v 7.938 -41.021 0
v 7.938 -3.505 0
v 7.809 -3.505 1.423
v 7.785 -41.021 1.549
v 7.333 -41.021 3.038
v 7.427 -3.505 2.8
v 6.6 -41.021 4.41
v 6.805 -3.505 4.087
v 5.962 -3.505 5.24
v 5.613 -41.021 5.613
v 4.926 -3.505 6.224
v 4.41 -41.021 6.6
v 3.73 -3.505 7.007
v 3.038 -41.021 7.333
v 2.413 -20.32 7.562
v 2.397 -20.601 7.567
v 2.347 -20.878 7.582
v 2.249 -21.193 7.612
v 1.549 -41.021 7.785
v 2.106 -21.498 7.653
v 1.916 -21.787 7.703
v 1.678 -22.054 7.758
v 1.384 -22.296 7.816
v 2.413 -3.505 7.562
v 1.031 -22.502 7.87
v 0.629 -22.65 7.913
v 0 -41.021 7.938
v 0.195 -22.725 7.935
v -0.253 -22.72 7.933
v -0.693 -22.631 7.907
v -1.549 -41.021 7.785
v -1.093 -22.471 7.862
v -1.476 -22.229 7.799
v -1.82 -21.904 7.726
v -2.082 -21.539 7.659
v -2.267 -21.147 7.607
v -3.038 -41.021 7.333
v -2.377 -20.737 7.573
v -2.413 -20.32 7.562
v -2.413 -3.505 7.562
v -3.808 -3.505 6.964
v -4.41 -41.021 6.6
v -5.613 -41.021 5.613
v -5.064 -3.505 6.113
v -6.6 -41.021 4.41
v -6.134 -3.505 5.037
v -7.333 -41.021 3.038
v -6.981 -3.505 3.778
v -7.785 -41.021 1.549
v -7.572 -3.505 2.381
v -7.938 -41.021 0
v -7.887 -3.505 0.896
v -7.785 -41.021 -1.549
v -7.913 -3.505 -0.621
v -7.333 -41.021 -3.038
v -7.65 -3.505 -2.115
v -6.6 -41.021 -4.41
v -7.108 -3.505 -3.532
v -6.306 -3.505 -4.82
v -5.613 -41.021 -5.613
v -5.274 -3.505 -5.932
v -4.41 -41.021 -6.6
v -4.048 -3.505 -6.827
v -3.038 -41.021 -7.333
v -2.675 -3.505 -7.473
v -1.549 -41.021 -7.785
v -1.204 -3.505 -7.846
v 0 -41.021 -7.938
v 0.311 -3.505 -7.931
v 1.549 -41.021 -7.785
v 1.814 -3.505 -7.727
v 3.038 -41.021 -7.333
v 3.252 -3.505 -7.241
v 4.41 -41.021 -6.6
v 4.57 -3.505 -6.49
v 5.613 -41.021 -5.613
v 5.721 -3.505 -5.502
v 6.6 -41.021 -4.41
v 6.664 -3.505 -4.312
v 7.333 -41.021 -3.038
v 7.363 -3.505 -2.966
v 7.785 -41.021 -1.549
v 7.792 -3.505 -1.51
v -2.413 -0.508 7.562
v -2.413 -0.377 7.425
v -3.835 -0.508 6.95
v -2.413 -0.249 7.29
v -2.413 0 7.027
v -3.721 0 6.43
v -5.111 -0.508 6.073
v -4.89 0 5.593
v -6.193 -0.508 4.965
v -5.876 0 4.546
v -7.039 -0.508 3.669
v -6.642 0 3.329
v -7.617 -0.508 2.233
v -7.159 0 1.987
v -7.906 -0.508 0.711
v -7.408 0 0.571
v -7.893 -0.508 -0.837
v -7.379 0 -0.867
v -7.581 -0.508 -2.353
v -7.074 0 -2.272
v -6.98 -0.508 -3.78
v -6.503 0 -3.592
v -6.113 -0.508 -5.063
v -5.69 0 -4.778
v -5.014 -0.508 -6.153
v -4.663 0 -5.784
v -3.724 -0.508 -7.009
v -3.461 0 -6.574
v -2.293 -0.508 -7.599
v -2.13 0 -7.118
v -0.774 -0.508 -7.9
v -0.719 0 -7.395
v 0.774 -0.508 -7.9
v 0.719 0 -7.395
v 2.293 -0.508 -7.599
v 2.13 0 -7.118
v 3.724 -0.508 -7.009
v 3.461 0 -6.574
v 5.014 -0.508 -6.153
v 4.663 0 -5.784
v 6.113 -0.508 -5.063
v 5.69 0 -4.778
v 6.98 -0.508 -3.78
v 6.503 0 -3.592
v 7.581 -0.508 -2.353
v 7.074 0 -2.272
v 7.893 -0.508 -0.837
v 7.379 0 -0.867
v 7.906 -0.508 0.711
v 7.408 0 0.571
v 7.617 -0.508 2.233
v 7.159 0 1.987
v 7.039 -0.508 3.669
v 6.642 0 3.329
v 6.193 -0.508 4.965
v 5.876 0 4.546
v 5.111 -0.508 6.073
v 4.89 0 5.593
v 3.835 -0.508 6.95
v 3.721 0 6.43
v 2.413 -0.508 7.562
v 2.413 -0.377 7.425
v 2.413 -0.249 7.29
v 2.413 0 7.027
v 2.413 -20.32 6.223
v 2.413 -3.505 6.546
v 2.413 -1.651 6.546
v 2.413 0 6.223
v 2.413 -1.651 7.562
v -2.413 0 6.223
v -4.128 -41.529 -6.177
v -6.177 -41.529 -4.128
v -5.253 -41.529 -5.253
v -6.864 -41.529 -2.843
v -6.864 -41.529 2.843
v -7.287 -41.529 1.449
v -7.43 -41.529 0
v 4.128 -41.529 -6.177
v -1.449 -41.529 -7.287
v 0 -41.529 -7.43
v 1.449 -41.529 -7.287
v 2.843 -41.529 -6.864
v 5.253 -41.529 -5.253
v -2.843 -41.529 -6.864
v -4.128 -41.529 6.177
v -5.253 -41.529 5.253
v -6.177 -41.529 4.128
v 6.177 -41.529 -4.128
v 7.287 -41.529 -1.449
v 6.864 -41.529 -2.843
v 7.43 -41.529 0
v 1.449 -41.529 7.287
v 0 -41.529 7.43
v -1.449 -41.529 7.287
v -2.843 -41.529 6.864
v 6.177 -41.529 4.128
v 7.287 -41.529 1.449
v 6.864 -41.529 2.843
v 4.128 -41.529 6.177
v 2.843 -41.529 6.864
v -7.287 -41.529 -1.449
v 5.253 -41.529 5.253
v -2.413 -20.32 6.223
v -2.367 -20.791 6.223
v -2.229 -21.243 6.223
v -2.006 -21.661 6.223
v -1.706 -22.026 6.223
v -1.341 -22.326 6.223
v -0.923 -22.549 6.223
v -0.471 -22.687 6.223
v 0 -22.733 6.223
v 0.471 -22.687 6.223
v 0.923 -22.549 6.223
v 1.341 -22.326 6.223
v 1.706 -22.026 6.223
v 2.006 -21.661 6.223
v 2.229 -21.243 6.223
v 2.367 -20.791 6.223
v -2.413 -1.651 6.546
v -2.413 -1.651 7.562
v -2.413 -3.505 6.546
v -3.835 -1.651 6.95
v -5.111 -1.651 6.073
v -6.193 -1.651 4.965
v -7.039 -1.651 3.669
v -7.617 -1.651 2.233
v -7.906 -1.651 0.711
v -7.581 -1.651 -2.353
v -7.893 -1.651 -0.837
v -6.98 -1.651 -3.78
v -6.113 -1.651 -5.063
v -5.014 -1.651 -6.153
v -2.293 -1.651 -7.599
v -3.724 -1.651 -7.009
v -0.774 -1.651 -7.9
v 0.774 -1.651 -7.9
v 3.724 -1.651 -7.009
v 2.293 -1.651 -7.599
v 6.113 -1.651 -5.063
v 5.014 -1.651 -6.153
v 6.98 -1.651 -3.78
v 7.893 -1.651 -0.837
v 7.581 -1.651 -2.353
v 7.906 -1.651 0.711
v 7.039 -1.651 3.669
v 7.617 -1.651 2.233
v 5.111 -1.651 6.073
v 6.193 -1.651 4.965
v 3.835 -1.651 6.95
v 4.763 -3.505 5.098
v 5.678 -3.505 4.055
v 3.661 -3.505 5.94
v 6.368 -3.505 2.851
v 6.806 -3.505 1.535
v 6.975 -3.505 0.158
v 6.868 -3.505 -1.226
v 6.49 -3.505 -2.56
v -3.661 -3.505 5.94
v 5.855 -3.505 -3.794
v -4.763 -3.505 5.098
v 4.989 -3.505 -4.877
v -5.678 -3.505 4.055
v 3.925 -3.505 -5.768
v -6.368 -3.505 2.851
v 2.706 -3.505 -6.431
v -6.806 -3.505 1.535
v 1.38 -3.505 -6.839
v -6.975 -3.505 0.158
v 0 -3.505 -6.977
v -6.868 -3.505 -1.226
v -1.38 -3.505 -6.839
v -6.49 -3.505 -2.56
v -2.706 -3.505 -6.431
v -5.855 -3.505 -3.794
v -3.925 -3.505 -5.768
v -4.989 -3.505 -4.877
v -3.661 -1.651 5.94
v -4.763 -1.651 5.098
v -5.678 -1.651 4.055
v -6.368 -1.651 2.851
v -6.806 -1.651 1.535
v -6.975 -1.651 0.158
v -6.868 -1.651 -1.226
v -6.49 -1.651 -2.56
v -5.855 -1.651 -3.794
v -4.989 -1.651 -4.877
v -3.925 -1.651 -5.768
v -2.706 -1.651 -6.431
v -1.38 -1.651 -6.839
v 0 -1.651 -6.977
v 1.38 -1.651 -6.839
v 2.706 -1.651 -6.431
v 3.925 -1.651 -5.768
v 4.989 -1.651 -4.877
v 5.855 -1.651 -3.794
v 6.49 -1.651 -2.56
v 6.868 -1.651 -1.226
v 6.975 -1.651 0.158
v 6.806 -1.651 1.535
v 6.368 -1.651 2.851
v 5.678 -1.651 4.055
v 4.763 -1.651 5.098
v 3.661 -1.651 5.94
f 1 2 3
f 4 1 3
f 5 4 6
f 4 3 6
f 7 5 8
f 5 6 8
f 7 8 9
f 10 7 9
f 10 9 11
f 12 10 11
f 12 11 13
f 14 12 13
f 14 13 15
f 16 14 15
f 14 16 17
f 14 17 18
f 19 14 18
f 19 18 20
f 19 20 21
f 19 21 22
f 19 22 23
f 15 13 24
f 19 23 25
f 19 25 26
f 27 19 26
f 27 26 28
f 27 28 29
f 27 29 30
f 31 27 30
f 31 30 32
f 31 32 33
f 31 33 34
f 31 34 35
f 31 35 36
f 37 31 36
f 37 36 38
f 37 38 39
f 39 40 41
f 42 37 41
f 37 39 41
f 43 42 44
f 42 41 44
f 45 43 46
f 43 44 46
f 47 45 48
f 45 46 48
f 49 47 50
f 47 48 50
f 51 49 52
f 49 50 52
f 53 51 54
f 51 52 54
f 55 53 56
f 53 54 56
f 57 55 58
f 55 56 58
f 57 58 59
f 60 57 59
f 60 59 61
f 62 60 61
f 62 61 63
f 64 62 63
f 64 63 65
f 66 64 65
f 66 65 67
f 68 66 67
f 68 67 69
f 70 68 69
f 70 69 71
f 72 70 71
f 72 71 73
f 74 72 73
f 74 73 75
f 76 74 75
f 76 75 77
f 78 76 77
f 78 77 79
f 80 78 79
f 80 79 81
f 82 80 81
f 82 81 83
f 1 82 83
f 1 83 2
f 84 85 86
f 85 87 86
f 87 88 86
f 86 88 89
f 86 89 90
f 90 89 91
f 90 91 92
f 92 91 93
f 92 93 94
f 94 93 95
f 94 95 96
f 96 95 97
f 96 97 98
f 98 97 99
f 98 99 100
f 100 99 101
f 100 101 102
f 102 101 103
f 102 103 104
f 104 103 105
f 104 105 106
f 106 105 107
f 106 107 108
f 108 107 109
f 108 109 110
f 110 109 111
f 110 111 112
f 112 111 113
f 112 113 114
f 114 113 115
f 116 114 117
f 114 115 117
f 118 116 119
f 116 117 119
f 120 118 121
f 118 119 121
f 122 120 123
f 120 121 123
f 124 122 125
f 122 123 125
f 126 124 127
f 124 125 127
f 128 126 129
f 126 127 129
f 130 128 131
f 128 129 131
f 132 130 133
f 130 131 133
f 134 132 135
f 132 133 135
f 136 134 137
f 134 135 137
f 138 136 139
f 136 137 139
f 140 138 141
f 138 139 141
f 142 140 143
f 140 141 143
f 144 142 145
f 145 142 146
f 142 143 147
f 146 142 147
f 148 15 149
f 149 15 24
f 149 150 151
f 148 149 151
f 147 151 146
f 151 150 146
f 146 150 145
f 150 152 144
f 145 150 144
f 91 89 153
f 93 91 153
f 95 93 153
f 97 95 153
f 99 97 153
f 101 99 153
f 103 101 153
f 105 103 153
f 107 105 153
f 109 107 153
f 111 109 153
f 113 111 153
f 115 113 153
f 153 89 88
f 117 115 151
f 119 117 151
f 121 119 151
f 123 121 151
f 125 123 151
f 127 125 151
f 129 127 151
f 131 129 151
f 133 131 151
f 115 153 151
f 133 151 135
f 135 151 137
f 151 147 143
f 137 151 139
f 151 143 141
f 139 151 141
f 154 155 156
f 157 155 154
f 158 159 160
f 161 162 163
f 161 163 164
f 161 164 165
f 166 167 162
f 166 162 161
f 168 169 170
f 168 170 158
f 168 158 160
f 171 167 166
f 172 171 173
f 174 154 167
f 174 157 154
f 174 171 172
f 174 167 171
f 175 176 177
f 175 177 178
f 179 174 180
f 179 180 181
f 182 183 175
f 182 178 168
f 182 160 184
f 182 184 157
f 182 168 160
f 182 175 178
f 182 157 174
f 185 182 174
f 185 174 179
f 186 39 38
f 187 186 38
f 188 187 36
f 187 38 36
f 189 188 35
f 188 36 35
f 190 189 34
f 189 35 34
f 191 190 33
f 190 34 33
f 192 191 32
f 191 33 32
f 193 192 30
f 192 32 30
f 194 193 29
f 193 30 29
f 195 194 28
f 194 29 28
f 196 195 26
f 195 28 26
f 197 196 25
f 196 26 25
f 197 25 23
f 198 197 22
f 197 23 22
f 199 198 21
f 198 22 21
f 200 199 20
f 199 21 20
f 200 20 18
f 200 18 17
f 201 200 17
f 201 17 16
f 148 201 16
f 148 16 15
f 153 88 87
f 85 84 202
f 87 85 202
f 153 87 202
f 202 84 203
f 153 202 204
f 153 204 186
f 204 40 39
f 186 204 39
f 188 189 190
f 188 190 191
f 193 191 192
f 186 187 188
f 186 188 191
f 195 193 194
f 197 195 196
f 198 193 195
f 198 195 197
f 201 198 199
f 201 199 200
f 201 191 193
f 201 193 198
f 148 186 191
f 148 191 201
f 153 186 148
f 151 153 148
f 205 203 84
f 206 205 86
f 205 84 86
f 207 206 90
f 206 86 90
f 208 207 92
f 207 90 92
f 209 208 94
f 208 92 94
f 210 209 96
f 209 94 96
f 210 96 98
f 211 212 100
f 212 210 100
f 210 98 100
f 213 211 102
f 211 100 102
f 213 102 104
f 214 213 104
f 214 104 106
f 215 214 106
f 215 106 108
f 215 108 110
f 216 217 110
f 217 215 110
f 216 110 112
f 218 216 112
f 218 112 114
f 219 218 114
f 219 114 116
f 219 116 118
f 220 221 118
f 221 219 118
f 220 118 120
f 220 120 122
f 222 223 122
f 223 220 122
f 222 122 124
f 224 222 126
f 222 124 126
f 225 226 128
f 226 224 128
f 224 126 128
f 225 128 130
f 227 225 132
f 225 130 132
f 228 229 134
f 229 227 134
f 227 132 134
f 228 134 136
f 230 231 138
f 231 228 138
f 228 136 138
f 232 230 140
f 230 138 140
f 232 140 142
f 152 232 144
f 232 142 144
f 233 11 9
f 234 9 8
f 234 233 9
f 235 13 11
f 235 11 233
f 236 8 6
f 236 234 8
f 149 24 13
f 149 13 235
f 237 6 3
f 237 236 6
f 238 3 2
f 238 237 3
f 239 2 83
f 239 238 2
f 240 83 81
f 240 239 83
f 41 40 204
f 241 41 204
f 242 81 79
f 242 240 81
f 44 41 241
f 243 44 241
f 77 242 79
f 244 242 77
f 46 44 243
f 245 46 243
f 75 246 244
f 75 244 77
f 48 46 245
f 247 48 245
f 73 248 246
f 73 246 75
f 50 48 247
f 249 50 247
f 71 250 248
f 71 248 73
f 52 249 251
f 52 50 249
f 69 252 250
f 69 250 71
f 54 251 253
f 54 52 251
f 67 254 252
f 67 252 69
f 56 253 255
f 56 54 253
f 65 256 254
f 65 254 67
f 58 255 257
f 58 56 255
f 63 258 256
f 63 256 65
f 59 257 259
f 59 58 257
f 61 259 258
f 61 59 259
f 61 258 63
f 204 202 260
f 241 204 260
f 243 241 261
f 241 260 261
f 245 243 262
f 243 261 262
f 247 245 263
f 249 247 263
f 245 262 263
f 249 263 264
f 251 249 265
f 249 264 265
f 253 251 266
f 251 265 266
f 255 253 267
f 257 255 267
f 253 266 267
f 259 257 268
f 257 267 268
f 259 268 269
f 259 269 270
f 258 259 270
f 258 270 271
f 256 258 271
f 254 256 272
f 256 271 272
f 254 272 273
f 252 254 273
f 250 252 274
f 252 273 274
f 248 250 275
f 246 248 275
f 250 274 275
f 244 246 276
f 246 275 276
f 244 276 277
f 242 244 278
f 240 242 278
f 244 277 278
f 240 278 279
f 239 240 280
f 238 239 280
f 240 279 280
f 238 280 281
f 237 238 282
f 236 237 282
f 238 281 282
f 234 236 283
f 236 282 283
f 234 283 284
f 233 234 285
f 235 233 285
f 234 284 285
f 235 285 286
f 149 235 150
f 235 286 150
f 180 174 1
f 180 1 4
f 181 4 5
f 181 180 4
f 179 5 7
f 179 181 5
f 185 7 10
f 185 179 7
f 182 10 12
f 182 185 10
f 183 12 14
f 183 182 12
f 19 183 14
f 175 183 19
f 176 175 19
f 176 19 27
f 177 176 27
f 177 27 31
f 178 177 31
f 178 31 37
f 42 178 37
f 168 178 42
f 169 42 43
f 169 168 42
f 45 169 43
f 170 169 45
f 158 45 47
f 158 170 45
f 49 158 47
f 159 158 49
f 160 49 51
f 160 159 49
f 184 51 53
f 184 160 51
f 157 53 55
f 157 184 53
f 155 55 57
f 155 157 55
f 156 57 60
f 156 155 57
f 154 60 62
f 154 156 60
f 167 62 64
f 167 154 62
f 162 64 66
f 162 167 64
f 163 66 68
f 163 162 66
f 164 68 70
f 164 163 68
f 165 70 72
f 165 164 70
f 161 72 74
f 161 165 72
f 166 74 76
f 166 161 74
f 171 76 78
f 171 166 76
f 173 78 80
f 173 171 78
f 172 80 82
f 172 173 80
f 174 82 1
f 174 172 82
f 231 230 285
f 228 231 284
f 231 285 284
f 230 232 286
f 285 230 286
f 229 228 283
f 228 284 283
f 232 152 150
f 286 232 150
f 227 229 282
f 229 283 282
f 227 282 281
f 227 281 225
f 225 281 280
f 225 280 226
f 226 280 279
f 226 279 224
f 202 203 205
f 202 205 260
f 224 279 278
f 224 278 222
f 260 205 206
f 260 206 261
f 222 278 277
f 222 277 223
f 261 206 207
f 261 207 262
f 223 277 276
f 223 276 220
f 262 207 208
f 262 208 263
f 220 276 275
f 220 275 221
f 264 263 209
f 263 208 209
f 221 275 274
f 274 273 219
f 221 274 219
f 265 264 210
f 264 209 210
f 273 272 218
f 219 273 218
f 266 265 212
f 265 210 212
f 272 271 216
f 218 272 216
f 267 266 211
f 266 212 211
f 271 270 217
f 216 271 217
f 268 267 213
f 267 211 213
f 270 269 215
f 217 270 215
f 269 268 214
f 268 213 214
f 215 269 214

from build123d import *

# Parameters (mm, degrees)
F0_R     = 7.9375
F1_DEPTH = 41.529
F4_DEPTH = 3.175
F5_W     = 1.8542
F5_H     = 3.048
F7_SIZE  = 0.508


with BuildPart() as f1:
    # F0 (on Front) → F1 (new body)
    with BuildSketch(Plane.XZ):
        Circle(F0_R)
    extrude(amount=F1_DEPTH)

    # F3 (on offset) → F4 (cut)
    with BuildSketch(Plane.XY.offset(9.398)):
        with BuildLine():
            Line((2.413, -20.32), (2.413, 0))
            Line((2.413, 0), (-2.413, 0))
            Line((-2.413, 0), (-2.413, -20.32))
            ThreePointArc((-2.413, -20.32), (0, -22.733), (2.413, -20.32))
        make_face()
    extrude(amount=-F4_DEPTH, mode=Mode.SUBTRACT)

    # F5 (on Right) → F6 (revolve, cut)
    with BuildSketch(Plane.YZ):
        with Locations((-2.5781, 8.500982)):
            Rectangle(F5_W, F5_H)
    revolve(axis=Axis((0, 0, 0), (0, -1, 0)), mode=Mode.SUBTRACT)

    # F7
    f7_edges = [f1.edges().sort_by_distance(p)[0] for p in [
        (-7.9375, -41.529, 0),
        (0, 0, -7.9375),
    ]]
    chamfer(f7_edges, length=F7_SIZE)


solid = f1.part
